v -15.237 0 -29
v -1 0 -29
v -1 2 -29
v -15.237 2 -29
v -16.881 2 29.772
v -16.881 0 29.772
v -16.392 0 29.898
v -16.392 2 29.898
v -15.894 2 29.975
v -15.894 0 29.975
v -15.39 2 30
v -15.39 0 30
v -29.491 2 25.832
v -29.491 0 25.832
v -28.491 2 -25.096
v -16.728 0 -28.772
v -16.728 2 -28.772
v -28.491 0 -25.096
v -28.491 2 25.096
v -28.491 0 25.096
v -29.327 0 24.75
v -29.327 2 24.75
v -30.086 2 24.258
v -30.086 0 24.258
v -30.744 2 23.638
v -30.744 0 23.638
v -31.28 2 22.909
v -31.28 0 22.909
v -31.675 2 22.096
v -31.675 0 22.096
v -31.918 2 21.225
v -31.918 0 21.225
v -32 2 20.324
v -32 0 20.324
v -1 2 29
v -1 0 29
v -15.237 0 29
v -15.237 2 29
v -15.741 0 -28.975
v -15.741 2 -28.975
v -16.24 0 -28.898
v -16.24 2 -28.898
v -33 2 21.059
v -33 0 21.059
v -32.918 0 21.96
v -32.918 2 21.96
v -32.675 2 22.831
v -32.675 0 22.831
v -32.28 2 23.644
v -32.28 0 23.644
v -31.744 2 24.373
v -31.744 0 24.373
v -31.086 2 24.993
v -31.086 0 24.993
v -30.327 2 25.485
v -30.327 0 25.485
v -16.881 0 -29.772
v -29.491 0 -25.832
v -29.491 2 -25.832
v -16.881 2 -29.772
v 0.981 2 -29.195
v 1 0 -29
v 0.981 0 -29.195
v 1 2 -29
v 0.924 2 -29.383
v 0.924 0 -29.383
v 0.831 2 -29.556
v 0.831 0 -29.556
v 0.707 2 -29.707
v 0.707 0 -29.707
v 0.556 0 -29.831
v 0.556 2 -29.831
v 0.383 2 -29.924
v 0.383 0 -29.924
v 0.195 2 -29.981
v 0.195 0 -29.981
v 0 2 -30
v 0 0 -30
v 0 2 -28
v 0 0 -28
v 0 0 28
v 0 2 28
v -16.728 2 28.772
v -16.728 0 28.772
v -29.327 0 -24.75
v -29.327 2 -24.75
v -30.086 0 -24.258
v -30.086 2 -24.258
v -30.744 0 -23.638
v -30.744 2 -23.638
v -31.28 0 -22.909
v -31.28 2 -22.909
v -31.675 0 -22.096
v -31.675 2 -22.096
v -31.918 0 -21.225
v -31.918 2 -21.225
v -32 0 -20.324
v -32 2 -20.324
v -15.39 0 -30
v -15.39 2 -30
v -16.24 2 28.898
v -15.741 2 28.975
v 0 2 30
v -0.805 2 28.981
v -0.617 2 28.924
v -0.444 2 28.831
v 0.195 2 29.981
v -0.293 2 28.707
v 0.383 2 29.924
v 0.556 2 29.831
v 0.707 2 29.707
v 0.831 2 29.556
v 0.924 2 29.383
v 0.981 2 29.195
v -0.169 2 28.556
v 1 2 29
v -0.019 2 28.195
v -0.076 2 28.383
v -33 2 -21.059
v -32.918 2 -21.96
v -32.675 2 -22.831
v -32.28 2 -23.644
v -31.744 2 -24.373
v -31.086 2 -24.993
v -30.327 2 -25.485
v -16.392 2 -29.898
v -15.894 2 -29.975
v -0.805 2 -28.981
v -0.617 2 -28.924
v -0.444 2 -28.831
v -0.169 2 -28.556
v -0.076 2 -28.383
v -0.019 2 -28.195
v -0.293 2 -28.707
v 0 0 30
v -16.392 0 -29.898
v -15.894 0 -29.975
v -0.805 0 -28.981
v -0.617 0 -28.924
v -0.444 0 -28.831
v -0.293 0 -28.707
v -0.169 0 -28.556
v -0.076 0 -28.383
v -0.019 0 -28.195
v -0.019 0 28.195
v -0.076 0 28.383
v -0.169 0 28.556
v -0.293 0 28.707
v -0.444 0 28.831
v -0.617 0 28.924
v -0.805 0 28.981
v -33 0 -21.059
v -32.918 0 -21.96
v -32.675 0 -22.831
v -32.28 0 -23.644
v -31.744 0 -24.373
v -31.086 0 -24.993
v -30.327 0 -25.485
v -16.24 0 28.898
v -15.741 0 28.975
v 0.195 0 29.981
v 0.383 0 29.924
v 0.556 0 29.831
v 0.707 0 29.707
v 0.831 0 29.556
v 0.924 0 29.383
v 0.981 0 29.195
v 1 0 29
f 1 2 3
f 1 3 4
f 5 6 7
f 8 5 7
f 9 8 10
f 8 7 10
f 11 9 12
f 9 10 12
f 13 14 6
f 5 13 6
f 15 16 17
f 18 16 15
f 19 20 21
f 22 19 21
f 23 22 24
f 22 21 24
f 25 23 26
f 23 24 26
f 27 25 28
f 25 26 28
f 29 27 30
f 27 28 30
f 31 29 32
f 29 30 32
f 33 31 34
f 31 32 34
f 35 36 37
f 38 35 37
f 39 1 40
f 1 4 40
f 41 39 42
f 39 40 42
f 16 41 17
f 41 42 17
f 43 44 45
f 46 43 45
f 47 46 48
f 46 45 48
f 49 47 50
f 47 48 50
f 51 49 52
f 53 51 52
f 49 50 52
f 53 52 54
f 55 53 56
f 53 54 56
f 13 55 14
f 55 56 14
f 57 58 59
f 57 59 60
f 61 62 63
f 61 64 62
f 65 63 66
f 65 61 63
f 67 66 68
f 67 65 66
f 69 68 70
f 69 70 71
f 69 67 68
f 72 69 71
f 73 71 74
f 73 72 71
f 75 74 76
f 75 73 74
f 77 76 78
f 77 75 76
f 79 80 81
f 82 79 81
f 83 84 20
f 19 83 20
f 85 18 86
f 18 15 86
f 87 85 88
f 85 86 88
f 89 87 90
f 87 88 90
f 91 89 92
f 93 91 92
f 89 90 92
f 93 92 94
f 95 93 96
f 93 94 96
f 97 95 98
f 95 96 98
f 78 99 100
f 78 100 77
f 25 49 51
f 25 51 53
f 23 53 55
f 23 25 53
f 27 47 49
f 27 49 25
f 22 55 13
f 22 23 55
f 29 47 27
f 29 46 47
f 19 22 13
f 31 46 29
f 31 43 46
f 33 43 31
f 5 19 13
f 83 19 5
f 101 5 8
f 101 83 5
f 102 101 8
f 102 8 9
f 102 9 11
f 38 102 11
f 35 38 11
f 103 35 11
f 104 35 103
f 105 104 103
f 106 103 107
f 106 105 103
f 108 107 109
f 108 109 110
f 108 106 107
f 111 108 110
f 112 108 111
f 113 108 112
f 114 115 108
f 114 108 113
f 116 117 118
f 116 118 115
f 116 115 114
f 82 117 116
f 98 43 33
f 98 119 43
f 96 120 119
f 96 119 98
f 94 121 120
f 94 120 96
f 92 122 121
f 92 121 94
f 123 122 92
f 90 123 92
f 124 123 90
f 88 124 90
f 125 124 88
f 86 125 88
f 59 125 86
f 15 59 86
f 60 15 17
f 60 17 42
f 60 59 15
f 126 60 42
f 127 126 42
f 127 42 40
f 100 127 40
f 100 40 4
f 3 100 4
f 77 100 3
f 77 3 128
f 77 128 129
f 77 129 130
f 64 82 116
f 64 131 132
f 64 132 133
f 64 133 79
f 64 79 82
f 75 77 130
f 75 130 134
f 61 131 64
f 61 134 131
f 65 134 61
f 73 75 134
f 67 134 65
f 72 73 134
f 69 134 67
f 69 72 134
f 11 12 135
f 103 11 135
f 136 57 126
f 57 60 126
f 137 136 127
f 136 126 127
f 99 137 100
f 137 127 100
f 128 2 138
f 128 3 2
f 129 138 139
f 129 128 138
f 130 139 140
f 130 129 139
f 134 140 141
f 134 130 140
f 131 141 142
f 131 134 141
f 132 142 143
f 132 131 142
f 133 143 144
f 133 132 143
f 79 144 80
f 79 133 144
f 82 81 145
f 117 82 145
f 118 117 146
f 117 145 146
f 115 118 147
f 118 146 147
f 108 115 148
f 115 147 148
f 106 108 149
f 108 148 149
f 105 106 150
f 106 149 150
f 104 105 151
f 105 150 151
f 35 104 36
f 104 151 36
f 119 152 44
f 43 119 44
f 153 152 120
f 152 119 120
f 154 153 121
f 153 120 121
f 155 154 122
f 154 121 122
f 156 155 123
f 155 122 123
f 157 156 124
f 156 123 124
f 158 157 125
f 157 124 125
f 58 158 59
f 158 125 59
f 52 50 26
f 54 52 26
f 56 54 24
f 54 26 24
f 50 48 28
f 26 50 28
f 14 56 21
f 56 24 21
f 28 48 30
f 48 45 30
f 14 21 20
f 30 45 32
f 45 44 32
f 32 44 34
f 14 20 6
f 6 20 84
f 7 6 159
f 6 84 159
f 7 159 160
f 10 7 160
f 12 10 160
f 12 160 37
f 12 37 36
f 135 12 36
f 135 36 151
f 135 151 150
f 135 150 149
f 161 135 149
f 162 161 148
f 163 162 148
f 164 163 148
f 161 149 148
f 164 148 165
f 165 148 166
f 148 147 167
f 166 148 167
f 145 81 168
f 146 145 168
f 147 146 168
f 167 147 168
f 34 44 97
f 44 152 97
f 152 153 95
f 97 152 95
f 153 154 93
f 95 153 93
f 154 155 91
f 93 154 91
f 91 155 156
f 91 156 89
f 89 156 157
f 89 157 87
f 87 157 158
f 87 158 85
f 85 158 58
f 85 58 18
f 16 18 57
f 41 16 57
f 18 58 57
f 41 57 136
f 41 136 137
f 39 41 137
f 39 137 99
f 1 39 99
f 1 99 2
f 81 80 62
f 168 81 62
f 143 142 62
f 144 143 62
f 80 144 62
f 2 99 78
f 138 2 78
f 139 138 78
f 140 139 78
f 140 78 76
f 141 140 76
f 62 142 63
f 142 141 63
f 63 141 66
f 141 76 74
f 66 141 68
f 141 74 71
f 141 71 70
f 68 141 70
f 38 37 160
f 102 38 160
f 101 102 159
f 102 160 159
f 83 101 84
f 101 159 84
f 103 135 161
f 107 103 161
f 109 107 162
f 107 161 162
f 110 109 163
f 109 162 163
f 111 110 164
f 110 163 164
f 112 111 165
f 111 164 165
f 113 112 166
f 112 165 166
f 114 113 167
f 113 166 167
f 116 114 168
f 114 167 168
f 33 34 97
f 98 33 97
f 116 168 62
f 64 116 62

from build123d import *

# Parameters (mm, degrees)
EXTRUDE_1_DEPTH        = 2
FILLET_1_R             = 5
FILLET_2_R             = 1
FILLET_1_OF_MIRROR_1_R = 5
FILLET_2_OF_MIRROR_1_R = 1


with BuildPart() as part:
    # 草图1 → 凸台-拉伸1 (new body)
    with BuildSketch(Plane(origin=(0, 0, 0), x_dir=(1, 0, 0), z_dir=(0, 1, 0))):
        Polygon((0, 0), (0, 29), (-16, 29), (-32, 24), (-32, 0), (-33, 0), (-33, 24.735190913), (-16.152610923, 30), (1, 30), (1, 0), align=None)
    extrude_1 = extrude(amount=EXTRUDE_1_DEPTH)

    # 圆角1
    fillet_1_edges = [part.edges().sort_by_distance(p)[0] for p in [
        (-16, 1, -29),
        (-16.152610923, 1, -30),
        (-33, 1, -24.735190913),
        (-32, 1, -24),
    ]]
    fillet(fillet_1_edges, radius=FILLET_1_R)

    # 圆角2
    fillet_2_edges = [part.edges().sort_by_distance(p)[0] for p in [
        (1, 1, -30),
        (0, 1, -29),
    ]]
    fillet(fillet_2_edges, radius=FILLET_2_R)

    # 镜向1: 凸台-拉伸1 across plane
    add(extrude_1.mirror(Plane.XY))

    # 圆角1 of 镜向1
    fillet_1_of_mirror_1_edges = [part.edges().sort_by_distance(p)[0] for p in [
        (-16, 1, 29),
        (-16.152610923, 1, 30),
        (-33, 1, 24.735190913),
        (-32, 1, 24),
    ]]
    fillet(fillet_1_of_mirror_1_edges, radius=FILLET_1_OF_MIRROR_1_R)

    # 圆角2 of 镜向1
    fillet_2_of_mirror_1_edges = [part.edges().sort_by_distance(p)[0] for p in [
        (1, 1, 30),
        (0, 1, 29),
    ]]
    fillet(fillet_2_of_mirror_1_edges, radius=FILLET_2_OF_MIRROR_1_R)


solid = part.part
